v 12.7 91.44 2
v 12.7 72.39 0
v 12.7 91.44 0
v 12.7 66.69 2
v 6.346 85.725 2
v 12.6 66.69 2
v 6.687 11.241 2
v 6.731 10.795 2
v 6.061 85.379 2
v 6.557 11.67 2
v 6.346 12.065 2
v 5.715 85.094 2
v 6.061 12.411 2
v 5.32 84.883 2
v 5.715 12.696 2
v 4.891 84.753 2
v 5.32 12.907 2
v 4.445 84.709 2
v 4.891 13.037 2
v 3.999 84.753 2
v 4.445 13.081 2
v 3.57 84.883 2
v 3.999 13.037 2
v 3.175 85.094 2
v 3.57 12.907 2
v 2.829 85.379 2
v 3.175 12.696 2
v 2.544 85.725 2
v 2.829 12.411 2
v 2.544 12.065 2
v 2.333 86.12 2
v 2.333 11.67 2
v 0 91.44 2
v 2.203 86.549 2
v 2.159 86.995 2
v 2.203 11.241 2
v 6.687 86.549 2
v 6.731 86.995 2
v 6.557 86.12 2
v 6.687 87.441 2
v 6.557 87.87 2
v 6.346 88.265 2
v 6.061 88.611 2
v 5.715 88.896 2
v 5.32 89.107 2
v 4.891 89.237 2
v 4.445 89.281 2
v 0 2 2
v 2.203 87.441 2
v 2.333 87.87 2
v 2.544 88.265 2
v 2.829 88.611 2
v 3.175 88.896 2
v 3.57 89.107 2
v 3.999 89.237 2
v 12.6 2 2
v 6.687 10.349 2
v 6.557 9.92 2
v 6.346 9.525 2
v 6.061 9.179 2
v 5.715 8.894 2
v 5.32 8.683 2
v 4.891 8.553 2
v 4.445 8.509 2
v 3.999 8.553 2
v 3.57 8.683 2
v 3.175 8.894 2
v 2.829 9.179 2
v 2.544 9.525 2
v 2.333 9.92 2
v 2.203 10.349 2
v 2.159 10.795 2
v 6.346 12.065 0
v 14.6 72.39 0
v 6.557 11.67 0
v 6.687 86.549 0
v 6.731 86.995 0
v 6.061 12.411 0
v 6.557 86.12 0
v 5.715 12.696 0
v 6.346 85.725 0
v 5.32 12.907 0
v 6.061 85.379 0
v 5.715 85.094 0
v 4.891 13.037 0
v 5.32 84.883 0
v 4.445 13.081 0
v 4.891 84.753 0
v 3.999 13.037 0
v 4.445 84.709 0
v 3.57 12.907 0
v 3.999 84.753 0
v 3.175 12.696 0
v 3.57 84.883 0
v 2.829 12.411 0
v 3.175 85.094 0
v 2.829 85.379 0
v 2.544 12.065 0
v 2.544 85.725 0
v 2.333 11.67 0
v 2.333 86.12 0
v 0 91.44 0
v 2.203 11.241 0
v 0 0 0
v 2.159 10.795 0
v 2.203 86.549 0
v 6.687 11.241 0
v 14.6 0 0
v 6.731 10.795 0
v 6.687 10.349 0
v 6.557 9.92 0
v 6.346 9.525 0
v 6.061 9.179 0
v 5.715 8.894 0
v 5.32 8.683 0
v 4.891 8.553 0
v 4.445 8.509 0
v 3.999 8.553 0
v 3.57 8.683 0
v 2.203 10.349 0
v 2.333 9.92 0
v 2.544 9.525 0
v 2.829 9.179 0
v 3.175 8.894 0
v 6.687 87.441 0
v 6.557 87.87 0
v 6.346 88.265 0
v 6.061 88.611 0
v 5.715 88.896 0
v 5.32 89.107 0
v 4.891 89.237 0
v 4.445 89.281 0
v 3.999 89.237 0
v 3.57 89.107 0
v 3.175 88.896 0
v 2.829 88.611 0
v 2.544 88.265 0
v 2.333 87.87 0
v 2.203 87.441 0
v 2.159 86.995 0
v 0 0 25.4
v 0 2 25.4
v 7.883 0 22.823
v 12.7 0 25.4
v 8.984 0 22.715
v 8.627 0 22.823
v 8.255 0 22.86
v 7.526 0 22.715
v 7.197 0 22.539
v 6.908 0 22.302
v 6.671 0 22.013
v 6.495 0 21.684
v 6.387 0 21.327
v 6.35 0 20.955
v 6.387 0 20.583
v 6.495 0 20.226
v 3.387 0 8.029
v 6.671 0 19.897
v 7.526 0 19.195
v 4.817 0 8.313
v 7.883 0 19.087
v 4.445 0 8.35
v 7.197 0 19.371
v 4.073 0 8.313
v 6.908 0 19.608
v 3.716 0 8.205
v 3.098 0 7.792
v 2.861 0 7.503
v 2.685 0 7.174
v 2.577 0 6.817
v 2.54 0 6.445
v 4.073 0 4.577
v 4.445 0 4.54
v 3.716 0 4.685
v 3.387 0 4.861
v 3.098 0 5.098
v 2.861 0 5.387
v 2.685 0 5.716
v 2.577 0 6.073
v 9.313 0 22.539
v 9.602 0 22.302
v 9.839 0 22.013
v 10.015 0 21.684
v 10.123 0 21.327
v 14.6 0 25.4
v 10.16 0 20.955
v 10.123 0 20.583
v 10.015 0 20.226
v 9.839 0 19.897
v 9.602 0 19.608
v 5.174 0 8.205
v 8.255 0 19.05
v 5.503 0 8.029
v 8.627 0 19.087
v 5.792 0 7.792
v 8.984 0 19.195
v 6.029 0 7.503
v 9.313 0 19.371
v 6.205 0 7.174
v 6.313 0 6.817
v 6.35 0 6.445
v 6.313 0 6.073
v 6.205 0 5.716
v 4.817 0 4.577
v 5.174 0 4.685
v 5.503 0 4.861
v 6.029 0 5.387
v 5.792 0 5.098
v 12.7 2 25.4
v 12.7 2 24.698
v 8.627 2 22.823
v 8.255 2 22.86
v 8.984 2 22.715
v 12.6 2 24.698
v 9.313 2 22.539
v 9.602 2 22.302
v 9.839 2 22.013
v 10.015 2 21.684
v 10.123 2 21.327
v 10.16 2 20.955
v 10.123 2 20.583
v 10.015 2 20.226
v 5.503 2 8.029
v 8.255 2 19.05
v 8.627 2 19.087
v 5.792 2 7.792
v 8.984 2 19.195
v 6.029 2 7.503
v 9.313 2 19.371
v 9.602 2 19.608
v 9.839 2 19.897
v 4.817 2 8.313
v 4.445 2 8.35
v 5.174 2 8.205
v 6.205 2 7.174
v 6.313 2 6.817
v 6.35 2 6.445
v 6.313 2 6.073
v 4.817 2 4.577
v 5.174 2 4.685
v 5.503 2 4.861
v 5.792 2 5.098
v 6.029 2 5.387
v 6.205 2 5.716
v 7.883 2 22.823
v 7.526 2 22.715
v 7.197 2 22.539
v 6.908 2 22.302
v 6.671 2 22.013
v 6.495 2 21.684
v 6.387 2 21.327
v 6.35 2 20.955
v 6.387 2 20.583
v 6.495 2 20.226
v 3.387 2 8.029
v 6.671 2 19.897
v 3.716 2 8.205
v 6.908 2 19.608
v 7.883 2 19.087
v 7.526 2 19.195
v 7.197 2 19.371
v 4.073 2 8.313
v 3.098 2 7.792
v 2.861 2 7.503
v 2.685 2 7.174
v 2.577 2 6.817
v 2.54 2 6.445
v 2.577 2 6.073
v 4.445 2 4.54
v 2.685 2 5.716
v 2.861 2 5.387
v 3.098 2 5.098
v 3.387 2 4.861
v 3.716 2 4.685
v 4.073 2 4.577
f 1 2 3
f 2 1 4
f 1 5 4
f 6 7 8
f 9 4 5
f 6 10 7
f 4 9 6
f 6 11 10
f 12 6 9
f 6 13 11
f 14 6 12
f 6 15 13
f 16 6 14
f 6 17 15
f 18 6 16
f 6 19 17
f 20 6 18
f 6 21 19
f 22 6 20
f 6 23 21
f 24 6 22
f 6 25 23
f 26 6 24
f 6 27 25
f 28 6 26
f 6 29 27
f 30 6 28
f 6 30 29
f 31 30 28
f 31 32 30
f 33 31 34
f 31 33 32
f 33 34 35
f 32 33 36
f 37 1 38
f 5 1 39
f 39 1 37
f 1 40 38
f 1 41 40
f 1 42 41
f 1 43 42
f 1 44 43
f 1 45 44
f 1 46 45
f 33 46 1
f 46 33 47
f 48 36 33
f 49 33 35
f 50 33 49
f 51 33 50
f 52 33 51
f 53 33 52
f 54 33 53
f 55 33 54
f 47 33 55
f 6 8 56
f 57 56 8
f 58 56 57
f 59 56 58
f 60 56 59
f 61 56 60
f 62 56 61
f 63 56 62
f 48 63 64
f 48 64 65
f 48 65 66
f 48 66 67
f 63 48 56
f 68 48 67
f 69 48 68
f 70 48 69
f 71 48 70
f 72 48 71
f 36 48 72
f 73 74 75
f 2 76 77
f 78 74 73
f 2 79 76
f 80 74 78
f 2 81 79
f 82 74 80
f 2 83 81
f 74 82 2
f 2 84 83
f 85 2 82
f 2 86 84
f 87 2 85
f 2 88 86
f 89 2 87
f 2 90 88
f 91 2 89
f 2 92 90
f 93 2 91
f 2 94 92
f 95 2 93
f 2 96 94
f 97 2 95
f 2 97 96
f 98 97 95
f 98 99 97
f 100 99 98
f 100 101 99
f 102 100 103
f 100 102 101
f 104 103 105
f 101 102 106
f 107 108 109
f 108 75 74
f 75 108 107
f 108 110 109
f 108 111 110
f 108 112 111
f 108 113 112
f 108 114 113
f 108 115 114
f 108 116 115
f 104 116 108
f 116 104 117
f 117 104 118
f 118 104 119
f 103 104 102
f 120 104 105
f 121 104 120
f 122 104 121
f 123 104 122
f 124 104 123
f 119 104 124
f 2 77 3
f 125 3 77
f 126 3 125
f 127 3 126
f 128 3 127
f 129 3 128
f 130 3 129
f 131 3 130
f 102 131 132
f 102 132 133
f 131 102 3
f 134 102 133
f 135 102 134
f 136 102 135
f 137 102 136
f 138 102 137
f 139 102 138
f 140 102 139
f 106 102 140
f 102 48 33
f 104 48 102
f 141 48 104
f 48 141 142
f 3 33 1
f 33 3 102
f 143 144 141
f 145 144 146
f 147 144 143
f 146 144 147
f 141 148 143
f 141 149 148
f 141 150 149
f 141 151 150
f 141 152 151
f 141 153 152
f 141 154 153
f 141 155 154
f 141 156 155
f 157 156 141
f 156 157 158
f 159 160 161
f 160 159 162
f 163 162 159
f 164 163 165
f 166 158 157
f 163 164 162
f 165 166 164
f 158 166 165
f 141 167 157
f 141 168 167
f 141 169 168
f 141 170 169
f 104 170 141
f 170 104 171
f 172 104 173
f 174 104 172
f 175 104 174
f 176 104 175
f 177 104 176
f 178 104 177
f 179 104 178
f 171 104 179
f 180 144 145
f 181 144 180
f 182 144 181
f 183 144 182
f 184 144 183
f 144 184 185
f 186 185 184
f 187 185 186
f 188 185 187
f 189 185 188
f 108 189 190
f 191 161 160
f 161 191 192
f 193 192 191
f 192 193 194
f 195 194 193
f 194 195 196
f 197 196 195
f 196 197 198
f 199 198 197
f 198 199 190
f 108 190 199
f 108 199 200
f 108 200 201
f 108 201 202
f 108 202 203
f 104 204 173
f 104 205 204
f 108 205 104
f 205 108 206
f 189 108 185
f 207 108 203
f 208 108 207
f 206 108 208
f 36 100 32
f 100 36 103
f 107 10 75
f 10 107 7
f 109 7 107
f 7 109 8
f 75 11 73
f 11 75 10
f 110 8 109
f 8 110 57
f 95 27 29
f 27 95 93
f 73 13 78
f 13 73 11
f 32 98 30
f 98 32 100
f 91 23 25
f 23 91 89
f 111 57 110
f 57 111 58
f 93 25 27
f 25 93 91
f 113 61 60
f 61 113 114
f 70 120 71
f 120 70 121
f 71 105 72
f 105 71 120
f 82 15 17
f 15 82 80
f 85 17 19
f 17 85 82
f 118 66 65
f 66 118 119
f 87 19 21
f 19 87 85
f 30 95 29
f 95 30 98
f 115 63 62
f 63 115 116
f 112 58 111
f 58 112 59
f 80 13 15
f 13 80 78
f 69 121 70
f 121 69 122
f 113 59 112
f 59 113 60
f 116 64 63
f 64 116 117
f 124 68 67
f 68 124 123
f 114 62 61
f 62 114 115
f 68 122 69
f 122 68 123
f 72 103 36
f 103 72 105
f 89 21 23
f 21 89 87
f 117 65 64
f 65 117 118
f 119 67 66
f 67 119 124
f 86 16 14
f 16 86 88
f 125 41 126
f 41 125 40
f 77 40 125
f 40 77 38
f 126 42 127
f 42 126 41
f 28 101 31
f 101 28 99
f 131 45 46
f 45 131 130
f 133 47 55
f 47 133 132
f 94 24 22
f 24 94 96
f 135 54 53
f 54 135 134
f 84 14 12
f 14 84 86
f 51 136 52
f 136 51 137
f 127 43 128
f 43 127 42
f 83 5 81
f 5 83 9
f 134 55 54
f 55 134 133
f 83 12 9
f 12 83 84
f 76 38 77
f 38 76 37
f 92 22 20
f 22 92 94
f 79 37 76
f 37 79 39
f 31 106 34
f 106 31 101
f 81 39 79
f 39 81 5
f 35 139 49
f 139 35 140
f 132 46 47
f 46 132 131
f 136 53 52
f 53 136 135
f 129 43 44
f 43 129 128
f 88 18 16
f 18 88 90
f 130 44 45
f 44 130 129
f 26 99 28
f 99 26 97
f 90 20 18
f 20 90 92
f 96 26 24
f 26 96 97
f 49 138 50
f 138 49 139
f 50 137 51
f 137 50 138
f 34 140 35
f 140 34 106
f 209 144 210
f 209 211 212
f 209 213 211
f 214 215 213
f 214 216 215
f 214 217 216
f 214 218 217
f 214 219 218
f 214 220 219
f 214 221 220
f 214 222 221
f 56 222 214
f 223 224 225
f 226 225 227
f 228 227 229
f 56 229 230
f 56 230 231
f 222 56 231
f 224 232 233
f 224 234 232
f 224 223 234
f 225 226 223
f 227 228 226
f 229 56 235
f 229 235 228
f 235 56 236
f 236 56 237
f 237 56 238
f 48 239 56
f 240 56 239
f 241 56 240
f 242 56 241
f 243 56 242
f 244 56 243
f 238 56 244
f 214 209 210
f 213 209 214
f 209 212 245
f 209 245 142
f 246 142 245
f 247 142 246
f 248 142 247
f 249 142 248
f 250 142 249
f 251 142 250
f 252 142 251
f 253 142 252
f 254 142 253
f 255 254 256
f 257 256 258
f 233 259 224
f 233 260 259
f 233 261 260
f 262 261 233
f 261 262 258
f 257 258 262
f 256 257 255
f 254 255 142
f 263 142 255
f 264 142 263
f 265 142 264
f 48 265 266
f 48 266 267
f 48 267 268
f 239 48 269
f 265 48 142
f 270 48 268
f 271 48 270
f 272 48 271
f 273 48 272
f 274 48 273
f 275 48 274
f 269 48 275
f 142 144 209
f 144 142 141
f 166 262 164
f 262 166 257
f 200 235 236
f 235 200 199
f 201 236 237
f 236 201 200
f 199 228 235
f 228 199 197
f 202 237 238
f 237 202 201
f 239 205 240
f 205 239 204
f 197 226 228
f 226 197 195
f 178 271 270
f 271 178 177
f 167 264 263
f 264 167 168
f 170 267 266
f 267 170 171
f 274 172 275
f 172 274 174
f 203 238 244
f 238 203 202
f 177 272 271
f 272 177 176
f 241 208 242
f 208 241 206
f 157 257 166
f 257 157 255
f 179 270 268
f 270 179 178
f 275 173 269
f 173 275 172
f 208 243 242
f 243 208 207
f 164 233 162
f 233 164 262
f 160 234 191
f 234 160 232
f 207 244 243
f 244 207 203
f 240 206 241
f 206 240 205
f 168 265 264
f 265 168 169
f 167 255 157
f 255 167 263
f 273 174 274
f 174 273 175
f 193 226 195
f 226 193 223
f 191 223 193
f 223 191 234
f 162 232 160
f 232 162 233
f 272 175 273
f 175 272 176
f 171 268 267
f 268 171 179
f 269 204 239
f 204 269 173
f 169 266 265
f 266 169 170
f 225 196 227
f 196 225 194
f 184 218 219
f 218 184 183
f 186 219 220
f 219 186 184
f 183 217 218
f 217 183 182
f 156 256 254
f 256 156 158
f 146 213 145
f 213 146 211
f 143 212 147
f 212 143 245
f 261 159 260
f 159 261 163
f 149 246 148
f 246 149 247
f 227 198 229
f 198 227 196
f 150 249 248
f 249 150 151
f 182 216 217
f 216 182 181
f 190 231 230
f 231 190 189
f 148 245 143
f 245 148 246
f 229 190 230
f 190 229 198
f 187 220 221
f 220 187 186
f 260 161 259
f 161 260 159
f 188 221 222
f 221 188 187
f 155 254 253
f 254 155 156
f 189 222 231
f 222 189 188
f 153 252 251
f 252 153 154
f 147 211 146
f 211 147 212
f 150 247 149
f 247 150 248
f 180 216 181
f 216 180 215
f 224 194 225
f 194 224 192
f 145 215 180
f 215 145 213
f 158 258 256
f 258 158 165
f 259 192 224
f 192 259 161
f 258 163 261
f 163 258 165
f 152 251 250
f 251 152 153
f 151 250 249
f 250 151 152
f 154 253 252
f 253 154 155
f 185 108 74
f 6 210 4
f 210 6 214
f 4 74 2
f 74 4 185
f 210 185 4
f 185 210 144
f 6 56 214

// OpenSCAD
//
// support bracket for CRT board
//

// printed with thk=1, too thin!  Maybe 1.5 or 2?
// Also the hole_dia of 0.170 is not quite big enough for 8-32 screws
//

$fn=32;
e=0.1;

function mm(x)=x*25.4;

pcb_len = mm(3.35);
pcb_hole_off = mm(0.175);
//pcb_hole_dia = mm(0.170);
pcb_hole_dia = mm(0.180);

pcb_up = mm(0.25);

brkt_wid = mm(0.5);
brkt_z = mm(1);
//thk = 1;
thk = 2;

side_len = pcb_len-mm(0.5);

module hole_at(x,y,dia) {
     translate( [x, y, -e])
	  cylinder( h=thk+2*e, d=dia);
}

module body() {
     difference() {
	  cube( [brkt_wid, pcb_len+pcb_up, thk]);
	  hole_at( pcb_hole_off, pcb_up+pcb_hole_off, pcb_hole_dia);
	  hole_at( pcb_hole_off, pcb_up+pcb_len-pcb_hole_off, pcb_hole_dia);
     }
}

module side() {
     linear_extrude( height=thk) {
	  polygon( points = [[0,0], [0, side_len], [brkt_z, 0]]);
     }
}

module base() {
     difference() {
	  cube( [brkt_wid, brkt_z, thk]);
	  hole_at( pcb_hole_off, thk+pcb_hole_off, mm(.150));
	  hole_at( brkt_wid-pcb_hole_off, brkt_z-pcb_hole_off, mm(.15));
     }
}


body();
translate( [brkt_wid+thk-e, 0, 0]) rotate( [0, -90, 0]) side();

translate( [0, thk, 0])
rotate( [90, 0, 0])
base();
